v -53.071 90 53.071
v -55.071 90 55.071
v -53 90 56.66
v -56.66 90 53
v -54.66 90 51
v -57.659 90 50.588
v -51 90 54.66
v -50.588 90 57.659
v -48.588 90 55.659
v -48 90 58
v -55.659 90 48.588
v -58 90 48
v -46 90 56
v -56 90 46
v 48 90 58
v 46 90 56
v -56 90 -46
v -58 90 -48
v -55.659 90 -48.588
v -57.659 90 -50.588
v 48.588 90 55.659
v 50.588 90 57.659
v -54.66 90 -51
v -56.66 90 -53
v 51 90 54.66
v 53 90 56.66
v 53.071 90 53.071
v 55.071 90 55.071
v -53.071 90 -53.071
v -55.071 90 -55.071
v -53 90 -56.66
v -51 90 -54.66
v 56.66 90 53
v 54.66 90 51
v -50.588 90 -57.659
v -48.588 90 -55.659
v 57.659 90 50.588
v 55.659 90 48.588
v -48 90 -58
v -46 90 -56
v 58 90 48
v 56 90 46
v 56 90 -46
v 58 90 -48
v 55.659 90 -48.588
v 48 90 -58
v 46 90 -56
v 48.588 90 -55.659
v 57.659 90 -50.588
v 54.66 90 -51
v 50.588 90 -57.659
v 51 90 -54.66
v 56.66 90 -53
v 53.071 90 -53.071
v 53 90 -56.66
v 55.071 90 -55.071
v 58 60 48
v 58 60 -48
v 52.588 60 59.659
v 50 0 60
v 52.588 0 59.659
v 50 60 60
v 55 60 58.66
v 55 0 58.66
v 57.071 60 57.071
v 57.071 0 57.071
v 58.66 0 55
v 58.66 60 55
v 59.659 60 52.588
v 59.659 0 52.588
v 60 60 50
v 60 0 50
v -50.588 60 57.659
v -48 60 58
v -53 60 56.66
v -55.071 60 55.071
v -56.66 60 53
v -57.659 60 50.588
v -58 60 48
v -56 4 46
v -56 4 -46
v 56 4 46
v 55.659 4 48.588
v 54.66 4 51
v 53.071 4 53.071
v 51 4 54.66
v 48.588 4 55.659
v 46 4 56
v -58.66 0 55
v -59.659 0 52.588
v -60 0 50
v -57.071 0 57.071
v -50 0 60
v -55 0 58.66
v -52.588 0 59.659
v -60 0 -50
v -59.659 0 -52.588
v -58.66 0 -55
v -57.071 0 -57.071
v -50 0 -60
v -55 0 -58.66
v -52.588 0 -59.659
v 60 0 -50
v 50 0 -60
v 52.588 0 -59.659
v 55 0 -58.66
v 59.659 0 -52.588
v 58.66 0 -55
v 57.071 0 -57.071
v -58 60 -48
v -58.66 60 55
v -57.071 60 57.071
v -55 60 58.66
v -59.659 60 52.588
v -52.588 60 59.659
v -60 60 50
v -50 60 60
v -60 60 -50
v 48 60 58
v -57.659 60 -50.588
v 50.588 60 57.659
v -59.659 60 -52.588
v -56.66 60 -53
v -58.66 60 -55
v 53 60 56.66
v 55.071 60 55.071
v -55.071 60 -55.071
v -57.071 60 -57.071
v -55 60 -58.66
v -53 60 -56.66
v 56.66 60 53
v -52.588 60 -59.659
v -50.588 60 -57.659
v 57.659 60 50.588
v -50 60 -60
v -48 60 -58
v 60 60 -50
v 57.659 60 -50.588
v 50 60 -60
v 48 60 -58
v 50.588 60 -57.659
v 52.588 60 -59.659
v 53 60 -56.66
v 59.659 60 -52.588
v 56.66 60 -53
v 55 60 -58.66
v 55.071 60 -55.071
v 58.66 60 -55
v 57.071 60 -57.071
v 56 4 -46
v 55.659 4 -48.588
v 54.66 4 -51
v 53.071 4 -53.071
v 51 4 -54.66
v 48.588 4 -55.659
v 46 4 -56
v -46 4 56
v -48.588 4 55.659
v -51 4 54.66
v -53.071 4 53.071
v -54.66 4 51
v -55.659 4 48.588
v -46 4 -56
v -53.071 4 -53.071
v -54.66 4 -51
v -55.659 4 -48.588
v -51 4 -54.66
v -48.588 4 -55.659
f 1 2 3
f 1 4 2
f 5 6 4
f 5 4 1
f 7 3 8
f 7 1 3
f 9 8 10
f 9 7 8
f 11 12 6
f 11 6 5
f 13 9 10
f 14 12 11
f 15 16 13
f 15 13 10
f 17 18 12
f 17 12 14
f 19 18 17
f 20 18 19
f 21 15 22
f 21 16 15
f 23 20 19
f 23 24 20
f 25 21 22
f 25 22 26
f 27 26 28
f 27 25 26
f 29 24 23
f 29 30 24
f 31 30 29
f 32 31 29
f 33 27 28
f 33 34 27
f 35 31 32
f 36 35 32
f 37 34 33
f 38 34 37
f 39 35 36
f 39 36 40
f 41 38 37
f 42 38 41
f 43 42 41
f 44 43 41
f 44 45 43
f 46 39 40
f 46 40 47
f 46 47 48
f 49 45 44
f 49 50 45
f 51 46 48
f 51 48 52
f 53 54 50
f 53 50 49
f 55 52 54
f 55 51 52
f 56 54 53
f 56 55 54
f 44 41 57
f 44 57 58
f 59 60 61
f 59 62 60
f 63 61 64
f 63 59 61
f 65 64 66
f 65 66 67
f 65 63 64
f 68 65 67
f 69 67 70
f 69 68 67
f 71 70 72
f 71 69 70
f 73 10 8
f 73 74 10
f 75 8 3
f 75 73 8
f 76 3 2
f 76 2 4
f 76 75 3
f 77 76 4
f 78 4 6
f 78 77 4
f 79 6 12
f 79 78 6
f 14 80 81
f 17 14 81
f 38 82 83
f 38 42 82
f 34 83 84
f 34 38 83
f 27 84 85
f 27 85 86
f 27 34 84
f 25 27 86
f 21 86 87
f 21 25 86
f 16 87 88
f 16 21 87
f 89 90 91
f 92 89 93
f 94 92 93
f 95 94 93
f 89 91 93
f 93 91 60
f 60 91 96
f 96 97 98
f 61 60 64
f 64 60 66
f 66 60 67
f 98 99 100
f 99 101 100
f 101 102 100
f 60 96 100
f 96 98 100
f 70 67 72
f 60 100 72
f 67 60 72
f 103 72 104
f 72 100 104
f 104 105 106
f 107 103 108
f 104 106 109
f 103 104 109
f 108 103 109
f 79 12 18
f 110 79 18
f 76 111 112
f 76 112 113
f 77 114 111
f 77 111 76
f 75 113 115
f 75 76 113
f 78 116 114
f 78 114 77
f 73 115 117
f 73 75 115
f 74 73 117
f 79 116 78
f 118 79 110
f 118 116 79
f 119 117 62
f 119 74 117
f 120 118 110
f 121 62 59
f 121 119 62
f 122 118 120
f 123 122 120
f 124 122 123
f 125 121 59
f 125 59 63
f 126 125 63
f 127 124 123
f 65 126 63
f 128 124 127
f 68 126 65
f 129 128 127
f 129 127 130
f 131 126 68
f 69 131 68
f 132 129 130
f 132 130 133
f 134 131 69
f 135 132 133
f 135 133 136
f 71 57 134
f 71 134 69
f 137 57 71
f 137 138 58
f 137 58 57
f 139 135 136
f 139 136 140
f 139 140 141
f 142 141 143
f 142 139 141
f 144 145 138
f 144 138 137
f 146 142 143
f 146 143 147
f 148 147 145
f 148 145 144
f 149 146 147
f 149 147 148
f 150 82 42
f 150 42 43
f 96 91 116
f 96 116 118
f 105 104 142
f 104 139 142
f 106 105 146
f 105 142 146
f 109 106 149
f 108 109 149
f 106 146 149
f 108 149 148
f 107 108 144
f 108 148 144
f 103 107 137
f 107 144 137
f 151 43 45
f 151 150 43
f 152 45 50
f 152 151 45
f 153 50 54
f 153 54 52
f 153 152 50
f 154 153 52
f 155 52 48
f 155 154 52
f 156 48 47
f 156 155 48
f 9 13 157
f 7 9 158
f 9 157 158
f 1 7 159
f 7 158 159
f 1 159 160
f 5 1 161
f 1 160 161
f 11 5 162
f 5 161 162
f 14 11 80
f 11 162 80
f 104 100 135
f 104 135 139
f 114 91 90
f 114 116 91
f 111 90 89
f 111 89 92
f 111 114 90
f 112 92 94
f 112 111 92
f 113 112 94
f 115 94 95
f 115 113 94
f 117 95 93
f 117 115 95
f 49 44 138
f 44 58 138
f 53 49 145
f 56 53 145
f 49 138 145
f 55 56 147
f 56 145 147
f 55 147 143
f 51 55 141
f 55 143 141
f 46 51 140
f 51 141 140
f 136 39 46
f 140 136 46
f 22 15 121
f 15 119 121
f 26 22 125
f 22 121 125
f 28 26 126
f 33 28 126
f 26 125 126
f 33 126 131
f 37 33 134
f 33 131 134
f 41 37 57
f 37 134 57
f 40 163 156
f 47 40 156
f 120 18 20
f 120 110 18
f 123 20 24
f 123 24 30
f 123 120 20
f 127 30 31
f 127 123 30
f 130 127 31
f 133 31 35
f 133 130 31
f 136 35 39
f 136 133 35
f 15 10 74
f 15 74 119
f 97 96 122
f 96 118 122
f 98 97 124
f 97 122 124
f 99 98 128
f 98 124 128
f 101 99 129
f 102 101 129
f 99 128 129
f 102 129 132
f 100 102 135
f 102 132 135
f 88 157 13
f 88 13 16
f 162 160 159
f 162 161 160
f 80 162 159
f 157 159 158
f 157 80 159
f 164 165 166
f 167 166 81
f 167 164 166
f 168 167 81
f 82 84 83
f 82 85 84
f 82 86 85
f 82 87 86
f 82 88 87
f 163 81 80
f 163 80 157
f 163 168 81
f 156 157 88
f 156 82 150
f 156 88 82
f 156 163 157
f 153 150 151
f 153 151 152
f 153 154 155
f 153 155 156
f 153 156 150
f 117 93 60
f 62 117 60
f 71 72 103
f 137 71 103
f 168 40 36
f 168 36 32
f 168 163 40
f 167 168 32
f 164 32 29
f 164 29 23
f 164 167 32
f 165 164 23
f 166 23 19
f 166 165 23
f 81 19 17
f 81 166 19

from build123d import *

# Parameters (mm, degrees)
CROQUIS2_W                   = 120
CROQUIS2_H                   = 120
SALIENTE_EXTRUIR1_DEPTH      = 90
VACIADO2_T                   = -4
CROQUIS3_W                   = 136
CROQUIS3_H                   = 136
CROQUIS3_W_2                 = 116
CROQUIS3_H_2                 = 116
CORTAR_EXTRUIR_L_MINA1_DEPTH = 30
REDONDEO3_R                  = 10


with BuildPart() as part:
    # Croquis2 → Saliente-Extruir1 (new body)
    with BuildSketch(Plane(origin=(0, 0, 0), x_dir=(1, 0, 0), z_dir=(0, 1, 0))):
        Rectangle(CROQUIS2_W, CROQUIS2_H)
    extrude(amount=SALIENTE_EXTRUIR1_DEPTH)

    # Vaciado2
    vaciado2_openings = [part.faces().sort_by_distance(p)[0] for p in [
        (0, 90, 0),
    ]]
    offset(amount=VACIADO2_T, openings=vaciado2_openings, kind=Kind.INTERSECTION)

    # Croquis3 → Cortar-Extruir-L_mina1 (cut)
    with BuildSketch(Plane(origin=(0, 90, 0), x_dir=(1, 0, 0), z_dir=(0, 1, 0))):
        Rectangle(CROQUIS3_W, CROQUIS3_H)
        Rectangle(CROQUIS3_W_2, CROQUIS3_H_2, mode=Mode.SUBTRACT)
    extrude(amount=-CORTAR_EXTRUIR_L_MINA1_DEPTH, mode=Mode.SUBTRACT)

    # Redondeo3
    redondeo3_edges = [part.edges().sort_by_distance(p)[0] for p in [
        (56, 47, 56),
        (56, 47, -56),
        (-56, 47, -56),
        (-56, 47, 56),
        (60, 30, 60),
        (-60, 30, 60),
        (-60, 30, -60),
        (60, 30, -60),
        (58, 75, 58),
        (-58, 75, 58),
        (-58, 75, -58),
        (58, 75, -58),
    ]]
    fillet(redondeo3_edges, radius=REDONDEO3_R)


solid = part.part
